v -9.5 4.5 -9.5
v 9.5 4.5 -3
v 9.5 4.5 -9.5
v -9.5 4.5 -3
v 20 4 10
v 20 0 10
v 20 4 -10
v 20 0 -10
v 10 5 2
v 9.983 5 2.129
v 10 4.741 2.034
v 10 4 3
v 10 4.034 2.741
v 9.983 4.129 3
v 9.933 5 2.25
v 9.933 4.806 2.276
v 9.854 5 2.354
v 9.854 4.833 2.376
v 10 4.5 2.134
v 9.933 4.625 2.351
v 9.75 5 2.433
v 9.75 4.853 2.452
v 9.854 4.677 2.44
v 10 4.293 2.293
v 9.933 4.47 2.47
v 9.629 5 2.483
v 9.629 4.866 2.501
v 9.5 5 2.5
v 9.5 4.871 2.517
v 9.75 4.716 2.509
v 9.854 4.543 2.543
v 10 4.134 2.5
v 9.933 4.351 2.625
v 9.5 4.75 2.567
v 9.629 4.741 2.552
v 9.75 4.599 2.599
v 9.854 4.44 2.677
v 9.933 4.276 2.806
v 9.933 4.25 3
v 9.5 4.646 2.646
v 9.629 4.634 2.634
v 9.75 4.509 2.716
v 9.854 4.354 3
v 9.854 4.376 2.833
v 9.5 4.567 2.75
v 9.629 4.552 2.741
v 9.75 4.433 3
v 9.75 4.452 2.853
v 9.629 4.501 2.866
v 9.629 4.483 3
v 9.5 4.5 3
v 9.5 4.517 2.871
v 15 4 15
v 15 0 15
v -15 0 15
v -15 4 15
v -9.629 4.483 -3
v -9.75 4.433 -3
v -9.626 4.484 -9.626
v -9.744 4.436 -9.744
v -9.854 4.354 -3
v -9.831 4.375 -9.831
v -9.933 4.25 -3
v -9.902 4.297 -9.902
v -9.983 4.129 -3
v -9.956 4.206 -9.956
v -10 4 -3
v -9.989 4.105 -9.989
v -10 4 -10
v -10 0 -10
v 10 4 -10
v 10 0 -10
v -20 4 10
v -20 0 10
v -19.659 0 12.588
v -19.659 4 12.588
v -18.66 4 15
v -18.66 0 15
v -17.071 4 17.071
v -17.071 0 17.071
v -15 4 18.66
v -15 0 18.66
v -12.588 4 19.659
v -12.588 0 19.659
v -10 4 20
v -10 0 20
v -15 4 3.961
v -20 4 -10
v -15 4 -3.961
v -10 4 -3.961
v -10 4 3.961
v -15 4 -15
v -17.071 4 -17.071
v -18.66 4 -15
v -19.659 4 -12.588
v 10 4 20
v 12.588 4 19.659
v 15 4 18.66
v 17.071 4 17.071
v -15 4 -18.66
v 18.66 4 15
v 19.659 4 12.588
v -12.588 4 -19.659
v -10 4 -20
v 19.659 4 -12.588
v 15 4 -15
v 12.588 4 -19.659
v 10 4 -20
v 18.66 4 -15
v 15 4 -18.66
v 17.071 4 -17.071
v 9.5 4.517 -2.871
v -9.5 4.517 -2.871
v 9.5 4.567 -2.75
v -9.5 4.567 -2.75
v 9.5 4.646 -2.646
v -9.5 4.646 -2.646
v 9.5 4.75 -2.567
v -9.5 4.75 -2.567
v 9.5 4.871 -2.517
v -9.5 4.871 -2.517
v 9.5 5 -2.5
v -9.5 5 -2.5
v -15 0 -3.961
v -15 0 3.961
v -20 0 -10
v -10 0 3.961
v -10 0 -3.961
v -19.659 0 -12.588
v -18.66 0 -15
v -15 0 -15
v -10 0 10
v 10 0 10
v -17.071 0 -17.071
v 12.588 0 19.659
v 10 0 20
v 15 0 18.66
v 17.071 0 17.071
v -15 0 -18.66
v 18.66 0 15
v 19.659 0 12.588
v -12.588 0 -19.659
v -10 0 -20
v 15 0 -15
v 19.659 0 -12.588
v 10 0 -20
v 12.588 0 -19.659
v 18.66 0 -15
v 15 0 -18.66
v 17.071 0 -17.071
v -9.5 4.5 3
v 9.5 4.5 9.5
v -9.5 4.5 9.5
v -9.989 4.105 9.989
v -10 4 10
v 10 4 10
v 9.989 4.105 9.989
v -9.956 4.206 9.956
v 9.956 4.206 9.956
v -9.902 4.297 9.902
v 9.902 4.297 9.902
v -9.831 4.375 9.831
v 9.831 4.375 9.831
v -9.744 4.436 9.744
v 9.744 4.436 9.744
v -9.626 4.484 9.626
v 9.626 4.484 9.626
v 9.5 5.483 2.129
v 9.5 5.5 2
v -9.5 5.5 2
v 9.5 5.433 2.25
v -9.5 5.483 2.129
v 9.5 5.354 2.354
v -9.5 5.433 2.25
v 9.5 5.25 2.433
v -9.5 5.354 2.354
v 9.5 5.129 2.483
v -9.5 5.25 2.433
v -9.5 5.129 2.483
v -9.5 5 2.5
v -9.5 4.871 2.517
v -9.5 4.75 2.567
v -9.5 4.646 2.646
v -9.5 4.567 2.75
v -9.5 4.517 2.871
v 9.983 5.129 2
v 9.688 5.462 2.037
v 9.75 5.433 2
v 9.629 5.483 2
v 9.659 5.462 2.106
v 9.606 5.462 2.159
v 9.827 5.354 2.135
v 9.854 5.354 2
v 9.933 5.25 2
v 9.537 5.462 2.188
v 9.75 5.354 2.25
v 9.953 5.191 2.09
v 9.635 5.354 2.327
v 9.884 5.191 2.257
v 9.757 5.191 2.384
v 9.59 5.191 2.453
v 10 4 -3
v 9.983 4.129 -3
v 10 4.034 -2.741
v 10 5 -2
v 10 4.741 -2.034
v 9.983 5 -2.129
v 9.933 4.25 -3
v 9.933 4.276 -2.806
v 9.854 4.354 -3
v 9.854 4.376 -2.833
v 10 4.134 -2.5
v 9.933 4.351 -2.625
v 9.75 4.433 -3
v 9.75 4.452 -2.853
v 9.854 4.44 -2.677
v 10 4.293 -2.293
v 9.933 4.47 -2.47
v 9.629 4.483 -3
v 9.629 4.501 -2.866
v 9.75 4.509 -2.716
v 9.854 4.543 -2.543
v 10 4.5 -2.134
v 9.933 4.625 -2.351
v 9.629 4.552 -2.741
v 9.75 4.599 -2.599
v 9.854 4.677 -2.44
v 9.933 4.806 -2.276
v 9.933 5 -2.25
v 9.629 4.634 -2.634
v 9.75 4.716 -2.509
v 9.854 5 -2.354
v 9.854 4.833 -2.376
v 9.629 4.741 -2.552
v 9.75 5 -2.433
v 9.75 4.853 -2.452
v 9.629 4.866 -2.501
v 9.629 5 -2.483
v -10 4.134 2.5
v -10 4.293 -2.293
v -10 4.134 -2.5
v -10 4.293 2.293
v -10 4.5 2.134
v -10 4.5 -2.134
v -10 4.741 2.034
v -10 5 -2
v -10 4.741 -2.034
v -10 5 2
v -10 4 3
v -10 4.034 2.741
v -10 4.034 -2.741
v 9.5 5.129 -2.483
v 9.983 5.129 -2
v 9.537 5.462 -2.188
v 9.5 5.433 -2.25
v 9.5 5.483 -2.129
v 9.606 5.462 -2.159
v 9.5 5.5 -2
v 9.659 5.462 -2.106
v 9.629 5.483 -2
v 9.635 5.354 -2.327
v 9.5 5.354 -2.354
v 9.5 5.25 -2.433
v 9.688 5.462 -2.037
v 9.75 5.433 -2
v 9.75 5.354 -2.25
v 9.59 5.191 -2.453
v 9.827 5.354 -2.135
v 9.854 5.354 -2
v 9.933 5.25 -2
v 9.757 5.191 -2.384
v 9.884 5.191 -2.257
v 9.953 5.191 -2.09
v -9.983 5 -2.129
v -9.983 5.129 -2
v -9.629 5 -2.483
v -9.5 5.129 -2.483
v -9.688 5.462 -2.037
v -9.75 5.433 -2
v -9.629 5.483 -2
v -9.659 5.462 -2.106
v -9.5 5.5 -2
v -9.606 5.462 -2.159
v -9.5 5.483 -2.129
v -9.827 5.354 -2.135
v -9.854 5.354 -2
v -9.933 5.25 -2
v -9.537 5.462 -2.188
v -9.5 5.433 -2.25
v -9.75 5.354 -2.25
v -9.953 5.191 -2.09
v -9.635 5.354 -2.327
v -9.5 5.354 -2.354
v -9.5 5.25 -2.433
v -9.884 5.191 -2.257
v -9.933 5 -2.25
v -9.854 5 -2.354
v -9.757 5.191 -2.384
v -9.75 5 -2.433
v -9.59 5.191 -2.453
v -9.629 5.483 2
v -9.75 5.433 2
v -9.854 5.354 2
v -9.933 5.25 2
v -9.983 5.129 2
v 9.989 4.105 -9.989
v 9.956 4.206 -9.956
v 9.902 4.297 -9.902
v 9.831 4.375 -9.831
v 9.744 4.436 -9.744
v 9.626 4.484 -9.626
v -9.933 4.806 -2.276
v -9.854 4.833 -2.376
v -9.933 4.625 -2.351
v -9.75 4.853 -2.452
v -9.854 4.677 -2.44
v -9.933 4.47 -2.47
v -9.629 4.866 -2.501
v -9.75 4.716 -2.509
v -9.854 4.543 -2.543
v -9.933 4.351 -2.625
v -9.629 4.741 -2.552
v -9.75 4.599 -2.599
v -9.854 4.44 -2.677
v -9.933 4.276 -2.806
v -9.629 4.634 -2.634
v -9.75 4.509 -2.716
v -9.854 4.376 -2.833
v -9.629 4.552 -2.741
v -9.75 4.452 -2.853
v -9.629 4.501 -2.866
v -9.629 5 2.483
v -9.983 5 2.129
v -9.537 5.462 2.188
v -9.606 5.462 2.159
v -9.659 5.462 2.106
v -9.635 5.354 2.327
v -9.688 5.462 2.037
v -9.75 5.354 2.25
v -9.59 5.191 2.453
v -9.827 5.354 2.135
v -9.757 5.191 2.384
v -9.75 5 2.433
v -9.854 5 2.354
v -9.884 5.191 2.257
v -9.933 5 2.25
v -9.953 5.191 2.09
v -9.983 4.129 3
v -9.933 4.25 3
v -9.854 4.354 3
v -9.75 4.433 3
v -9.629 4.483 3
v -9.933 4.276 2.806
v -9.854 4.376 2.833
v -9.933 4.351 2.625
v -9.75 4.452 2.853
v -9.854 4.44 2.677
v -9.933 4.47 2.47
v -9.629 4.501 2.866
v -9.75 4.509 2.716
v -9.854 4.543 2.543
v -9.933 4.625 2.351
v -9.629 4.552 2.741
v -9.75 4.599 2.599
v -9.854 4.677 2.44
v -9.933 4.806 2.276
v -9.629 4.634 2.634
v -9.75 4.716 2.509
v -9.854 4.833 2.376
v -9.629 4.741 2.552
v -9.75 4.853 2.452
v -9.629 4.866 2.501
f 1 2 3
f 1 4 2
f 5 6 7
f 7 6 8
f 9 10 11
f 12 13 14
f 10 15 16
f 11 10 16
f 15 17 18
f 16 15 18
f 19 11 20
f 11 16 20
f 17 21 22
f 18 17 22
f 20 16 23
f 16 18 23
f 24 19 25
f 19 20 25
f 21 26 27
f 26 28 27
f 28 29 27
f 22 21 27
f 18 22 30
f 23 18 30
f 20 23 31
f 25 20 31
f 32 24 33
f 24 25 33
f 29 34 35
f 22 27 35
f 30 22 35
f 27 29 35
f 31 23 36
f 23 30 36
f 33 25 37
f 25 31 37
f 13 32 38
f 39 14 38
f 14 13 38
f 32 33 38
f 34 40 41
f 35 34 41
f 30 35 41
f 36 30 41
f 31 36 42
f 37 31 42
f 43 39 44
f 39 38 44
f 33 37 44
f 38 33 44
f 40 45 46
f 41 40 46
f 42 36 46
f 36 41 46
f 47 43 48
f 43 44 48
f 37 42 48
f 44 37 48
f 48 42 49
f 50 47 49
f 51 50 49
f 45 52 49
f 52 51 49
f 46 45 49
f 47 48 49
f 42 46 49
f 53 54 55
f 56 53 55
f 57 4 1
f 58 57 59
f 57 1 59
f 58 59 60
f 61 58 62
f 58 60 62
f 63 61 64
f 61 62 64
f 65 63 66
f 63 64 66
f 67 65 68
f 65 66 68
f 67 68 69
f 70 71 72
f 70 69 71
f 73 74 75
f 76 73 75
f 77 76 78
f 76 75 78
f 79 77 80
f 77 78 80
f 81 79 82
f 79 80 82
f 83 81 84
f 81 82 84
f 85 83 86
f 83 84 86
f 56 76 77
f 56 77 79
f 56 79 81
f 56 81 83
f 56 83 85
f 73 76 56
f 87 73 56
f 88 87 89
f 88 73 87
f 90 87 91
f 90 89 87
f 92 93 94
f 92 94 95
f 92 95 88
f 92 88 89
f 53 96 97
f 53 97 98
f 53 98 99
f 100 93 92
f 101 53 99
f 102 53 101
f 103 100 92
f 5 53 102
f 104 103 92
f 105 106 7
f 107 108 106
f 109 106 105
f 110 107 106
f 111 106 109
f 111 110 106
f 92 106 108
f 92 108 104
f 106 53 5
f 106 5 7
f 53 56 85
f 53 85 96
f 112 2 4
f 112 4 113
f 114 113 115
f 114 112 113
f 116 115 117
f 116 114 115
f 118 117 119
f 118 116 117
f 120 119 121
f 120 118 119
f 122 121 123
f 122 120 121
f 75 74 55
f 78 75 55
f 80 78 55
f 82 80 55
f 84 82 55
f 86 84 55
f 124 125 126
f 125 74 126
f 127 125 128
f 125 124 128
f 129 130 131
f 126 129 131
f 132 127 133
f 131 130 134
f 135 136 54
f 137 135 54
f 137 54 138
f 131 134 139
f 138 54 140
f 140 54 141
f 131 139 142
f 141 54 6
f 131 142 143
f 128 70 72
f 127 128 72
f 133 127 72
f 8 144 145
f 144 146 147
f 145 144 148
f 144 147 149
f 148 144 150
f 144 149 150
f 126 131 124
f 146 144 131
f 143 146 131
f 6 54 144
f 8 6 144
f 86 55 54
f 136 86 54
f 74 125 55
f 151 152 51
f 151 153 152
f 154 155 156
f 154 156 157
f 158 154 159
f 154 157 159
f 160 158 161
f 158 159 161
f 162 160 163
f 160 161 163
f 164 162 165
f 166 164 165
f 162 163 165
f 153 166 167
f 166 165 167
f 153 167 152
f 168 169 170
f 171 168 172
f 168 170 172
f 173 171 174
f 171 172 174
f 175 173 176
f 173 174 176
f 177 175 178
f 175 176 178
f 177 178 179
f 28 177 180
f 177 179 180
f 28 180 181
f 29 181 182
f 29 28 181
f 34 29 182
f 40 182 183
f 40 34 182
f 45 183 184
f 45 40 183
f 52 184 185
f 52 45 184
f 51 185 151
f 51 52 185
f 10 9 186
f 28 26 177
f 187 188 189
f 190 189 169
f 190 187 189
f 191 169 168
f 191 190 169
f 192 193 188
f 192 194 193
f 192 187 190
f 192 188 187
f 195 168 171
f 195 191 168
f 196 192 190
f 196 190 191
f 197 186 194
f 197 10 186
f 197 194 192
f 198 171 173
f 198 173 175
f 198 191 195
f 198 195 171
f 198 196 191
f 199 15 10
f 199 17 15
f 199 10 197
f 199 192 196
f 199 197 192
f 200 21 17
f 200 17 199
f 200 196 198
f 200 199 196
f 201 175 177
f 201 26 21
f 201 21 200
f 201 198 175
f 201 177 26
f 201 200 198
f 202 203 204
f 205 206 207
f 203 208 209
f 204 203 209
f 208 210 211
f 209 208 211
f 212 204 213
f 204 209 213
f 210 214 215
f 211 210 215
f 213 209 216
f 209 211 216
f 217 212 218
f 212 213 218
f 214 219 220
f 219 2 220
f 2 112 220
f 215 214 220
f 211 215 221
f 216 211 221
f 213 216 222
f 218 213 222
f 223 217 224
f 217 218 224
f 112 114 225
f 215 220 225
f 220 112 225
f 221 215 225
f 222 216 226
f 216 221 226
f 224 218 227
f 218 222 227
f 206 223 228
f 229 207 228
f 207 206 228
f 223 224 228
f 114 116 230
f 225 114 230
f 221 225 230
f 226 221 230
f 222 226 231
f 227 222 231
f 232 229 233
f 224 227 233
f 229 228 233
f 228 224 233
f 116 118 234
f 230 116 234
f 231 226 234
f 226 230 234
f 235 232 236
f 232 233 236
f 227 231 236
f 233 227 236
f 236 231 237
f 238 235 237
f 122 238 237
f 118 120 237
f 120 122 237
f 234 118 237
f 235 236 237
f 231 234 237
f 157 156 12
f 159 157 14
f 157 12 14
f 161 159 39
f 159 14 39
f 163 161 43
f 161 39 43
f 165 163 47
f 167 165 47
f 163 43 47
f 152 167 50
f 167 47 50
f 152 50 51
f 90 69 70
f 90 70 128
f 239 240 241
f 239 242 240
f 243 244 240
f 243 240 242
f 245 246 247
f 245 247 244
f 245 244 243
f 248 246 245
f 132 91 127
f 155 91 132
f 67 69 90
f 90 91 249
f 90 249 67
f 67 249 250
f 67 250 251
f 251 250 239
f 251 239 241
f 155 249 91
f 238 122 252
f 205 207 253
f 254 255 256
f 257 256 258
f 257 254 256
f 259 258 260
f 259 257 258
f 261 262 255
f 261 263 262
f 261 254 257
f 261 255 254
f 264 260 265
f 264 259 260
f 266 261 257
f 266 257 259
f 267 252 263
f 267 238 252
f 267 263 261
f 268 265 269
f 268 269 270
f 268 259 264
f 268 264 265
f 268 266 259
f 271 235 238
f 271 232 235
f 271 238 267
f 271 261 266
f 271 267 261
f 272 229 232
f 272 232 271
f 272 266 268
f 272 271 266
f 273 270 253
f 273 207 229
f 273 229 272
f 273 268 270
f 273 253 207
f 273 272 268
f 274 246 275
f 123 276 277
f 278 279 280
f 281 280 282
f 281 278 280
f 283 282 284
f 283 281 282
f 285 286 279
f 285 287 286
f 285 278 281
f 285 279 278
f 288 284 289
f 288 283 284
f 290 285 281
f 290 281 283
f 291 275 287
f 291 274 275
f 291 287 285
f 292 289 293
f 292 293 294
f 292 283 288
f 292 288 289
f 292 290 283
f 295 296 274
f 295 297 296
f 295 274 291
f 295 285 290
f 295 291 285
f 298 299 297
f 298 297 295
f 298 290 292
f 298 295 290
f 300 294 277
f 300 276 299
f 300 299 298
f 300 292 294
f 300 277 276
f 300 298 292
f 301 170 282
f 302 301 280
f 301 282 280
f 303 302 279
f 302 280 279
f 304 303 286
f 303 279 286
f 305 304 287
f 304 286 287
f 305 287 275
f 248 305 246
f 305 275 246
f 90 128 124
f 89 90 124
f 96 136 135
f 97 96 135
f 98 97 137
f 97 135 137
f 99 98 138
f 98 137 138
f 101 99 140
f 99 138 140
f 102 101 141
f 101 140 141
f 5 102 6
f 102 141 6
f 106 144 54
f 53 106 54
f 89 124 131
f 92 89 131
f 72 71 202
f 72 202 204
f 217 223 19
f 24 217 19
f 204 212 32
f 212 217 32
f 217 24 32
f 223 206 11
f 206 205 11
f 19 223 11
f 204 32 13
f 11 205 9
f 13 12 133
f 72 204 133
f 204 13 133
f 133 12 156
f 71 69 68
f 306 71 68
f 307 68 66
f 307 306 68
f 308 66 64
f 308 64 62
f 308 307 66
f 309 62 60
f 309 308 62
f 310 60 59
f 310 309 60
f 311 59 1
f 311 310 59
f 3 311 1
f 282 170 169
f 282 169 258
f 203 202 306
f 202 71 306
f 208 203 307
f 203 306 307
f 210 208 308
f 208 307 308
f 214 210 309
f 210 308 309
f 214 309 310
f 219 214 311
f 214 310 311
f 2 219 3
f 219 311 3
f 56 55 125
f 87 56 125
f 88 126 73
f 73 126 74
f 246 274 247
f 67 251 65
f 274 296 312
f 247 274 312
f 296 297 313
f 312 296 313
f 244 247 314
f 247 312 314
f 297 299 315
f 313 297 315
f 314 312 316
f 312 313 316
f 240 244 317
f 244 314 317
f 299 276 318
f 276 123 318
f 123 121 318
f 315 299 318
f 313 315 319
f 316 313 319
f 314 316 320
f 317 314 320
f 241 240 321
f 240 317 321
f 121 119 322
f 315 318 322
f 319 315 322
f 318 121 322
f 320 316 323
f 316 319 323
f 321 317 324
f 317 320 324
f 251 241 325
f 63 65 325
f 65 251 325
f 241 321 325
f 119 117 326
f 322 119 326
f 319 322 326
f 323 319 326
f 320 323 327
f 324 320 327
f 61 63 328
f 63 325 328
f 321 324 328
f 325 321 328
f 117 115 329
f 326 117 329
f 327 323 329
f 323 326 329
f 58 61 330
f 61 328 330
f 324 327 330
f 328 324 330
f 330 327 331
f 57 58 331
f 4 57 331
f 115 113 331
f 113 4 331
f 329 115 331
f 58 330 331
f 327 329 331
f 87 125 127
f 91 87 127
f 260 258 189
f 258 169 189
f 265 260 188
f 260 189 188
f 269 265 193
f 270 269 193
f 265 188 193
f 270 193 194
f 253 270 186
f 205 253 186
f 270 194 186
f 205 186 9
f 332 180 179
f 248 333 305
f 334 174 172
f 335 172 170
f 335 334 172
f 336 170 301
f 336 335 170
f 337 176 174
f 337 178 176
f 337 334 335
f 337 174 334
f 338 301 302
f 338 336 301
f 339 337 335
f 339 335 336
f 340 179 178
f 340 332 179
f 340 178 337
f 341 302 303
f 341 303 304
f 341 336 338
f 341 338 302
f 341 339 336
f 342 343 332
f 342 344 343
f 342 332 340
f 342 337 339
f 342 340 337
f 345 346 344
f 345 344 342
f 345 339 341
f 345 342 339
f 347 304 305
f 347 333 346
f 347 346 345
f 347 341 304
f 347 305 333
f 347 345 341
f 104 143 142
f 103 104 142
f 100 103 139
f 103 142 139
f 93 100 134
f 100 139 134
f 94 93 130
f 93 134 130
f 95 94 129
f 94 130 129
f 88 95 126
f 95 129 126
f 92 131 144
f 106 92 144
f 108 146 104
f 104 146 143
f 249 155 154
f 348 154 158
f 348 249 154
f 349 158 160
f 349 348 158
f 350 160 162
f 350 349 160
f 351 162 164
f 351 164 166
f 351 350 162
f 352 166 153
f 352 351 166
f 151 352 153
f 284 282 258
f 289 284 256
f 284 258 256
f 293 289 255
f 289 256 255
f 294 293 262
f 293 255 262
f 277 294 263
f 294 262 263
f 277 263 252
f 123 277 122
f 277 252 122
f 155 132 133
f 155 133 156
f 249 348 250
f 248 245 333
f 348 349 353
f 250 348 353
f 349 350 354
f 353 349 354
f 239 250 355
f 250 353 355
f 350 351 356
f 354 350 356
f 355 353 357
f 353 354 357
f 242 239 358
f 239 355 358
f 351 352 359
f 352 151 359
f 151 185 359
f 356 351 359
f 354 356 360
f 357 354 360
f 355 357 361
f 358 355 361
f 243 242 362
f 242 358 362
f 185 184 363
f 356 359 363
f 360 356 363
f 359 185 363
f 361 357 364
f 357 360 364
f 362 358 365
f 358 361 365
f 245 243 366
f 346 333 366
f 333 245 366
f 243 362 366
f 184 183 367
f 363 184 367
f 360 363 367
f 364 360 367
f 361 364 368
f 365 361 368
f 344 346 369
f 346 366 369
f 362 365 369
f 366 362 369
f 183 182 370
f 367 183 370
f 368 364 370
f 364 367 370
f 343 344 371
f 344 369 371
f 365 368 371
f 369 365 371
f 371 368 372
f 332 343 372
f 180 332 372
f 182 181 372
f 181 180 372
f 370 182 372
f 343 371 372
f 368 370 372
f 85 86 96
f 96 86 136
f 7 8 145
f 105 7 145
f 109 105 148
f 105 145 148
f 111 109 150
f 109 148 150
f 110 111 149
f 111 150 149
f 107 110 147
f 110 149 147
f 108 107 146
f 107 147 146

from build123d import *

# Parameters (mm, degrees)
EXTRUDE_1_DEPTH = 4
EXTRUDE_2_DEPTH = 20
FILLET_1_R      = 0.5
FILLET_2_R      = 0.5


with BuildPart() as part:
    # 草图1 → 凸台-拉伸1 (new body)
    with BuildSketch(Plane(origin=(0, 0, 0), x_dir=(1, 0, 0), z_dir=(0, 1, 0))):
        with BuildLine():
            Line((-10, -20), (10, -20))
            ThreePointArc((10, -20), (17.071067812, -17.071067812), (20, -10))
            Line((20, -10), (20, 10))
            ThreePointArc((20, 10), (17.071067812, 17.071067812), (10, 20))
            Line((10, 20), (-10, 20))
            ThreePointArc((-10, 20), (-17.071067812, 17.071067812), (-20, 10))
            Line((-20, 10), (-20, -10))
            ThreePointArc((-20, -10), (-17.071067812, -17.071067812), (-10, -20))
        make_face()
        Polygon((-10, 3.960573477), (-15, 3.960573477), (-15, 15), (15, 15), (15, -15), (-15, -15), (-15, -3.960573477), (-10, -3.960573477), (-10, -10), (10, -10), (10, 10), (-10, 10), align=None, mode=Mode.SUBTRACT)
    extrude(amount=EXTRUDE_1_DEPTH)

    # 草图2 → 凸台-拉伸2 (add)
    with BuildSketch(Plane.ZY.offset(10)):
        Polygon((-10, 4), (10, 4), (10, 4.5), (2.5, 4.5), (2.5, 5.5), (-2.5, 5.5), (-2.5, 4.5), (-10, 4.5), align=None)
    extrude(amount=-EXTRUDE_2_DEPTH)

    # 圆角1
    fillet_1_edges = [part.edges().sort_by_distance(p)[0] for p in [
        (10, 4.5, -6.25),
        (0, 4.5, -10),
        (10, 5, -2.5),
        (0, 4.5, -2.5),
        (10, 5, 2.5),
        (10, 4.5, 6.25),
        (0, 4.5, 2.5),
        (0, 4.5, 10),
        (-10, 4.5, 6.25),
        (-10, 5, 2.5),
        (-10, 5, -2.5),
        (-10, 4.5, -6.25),
    ]]
    fillet(fillet_1_edges, radius=FILLET_1_R - 0.0001)  # a hair under: the kernel refuses the full size

    # 圆角2
    fillet_2_edges = [part.edges().sort_by_distance(p)[0] for p in [
        (9.85358268, 5.5, 2.35358268),
        (0, 5.5, 2.5),
        (-9.85358268, 5.5, 2.35358268),
        (-10, 5.5, 0),
        (-9.85358268, 5.5, -2.35358268),
        (0, 5.5, -2.5),
        (9.85358268, 5.5, -2.35358268),
        (10, 5.5, 0),
    ]]
    fillet(fillet_2_edges, radius=FILLET_2_R - 0.0001)  # a hair under: the kernel refuses the full size


solid = part.part
